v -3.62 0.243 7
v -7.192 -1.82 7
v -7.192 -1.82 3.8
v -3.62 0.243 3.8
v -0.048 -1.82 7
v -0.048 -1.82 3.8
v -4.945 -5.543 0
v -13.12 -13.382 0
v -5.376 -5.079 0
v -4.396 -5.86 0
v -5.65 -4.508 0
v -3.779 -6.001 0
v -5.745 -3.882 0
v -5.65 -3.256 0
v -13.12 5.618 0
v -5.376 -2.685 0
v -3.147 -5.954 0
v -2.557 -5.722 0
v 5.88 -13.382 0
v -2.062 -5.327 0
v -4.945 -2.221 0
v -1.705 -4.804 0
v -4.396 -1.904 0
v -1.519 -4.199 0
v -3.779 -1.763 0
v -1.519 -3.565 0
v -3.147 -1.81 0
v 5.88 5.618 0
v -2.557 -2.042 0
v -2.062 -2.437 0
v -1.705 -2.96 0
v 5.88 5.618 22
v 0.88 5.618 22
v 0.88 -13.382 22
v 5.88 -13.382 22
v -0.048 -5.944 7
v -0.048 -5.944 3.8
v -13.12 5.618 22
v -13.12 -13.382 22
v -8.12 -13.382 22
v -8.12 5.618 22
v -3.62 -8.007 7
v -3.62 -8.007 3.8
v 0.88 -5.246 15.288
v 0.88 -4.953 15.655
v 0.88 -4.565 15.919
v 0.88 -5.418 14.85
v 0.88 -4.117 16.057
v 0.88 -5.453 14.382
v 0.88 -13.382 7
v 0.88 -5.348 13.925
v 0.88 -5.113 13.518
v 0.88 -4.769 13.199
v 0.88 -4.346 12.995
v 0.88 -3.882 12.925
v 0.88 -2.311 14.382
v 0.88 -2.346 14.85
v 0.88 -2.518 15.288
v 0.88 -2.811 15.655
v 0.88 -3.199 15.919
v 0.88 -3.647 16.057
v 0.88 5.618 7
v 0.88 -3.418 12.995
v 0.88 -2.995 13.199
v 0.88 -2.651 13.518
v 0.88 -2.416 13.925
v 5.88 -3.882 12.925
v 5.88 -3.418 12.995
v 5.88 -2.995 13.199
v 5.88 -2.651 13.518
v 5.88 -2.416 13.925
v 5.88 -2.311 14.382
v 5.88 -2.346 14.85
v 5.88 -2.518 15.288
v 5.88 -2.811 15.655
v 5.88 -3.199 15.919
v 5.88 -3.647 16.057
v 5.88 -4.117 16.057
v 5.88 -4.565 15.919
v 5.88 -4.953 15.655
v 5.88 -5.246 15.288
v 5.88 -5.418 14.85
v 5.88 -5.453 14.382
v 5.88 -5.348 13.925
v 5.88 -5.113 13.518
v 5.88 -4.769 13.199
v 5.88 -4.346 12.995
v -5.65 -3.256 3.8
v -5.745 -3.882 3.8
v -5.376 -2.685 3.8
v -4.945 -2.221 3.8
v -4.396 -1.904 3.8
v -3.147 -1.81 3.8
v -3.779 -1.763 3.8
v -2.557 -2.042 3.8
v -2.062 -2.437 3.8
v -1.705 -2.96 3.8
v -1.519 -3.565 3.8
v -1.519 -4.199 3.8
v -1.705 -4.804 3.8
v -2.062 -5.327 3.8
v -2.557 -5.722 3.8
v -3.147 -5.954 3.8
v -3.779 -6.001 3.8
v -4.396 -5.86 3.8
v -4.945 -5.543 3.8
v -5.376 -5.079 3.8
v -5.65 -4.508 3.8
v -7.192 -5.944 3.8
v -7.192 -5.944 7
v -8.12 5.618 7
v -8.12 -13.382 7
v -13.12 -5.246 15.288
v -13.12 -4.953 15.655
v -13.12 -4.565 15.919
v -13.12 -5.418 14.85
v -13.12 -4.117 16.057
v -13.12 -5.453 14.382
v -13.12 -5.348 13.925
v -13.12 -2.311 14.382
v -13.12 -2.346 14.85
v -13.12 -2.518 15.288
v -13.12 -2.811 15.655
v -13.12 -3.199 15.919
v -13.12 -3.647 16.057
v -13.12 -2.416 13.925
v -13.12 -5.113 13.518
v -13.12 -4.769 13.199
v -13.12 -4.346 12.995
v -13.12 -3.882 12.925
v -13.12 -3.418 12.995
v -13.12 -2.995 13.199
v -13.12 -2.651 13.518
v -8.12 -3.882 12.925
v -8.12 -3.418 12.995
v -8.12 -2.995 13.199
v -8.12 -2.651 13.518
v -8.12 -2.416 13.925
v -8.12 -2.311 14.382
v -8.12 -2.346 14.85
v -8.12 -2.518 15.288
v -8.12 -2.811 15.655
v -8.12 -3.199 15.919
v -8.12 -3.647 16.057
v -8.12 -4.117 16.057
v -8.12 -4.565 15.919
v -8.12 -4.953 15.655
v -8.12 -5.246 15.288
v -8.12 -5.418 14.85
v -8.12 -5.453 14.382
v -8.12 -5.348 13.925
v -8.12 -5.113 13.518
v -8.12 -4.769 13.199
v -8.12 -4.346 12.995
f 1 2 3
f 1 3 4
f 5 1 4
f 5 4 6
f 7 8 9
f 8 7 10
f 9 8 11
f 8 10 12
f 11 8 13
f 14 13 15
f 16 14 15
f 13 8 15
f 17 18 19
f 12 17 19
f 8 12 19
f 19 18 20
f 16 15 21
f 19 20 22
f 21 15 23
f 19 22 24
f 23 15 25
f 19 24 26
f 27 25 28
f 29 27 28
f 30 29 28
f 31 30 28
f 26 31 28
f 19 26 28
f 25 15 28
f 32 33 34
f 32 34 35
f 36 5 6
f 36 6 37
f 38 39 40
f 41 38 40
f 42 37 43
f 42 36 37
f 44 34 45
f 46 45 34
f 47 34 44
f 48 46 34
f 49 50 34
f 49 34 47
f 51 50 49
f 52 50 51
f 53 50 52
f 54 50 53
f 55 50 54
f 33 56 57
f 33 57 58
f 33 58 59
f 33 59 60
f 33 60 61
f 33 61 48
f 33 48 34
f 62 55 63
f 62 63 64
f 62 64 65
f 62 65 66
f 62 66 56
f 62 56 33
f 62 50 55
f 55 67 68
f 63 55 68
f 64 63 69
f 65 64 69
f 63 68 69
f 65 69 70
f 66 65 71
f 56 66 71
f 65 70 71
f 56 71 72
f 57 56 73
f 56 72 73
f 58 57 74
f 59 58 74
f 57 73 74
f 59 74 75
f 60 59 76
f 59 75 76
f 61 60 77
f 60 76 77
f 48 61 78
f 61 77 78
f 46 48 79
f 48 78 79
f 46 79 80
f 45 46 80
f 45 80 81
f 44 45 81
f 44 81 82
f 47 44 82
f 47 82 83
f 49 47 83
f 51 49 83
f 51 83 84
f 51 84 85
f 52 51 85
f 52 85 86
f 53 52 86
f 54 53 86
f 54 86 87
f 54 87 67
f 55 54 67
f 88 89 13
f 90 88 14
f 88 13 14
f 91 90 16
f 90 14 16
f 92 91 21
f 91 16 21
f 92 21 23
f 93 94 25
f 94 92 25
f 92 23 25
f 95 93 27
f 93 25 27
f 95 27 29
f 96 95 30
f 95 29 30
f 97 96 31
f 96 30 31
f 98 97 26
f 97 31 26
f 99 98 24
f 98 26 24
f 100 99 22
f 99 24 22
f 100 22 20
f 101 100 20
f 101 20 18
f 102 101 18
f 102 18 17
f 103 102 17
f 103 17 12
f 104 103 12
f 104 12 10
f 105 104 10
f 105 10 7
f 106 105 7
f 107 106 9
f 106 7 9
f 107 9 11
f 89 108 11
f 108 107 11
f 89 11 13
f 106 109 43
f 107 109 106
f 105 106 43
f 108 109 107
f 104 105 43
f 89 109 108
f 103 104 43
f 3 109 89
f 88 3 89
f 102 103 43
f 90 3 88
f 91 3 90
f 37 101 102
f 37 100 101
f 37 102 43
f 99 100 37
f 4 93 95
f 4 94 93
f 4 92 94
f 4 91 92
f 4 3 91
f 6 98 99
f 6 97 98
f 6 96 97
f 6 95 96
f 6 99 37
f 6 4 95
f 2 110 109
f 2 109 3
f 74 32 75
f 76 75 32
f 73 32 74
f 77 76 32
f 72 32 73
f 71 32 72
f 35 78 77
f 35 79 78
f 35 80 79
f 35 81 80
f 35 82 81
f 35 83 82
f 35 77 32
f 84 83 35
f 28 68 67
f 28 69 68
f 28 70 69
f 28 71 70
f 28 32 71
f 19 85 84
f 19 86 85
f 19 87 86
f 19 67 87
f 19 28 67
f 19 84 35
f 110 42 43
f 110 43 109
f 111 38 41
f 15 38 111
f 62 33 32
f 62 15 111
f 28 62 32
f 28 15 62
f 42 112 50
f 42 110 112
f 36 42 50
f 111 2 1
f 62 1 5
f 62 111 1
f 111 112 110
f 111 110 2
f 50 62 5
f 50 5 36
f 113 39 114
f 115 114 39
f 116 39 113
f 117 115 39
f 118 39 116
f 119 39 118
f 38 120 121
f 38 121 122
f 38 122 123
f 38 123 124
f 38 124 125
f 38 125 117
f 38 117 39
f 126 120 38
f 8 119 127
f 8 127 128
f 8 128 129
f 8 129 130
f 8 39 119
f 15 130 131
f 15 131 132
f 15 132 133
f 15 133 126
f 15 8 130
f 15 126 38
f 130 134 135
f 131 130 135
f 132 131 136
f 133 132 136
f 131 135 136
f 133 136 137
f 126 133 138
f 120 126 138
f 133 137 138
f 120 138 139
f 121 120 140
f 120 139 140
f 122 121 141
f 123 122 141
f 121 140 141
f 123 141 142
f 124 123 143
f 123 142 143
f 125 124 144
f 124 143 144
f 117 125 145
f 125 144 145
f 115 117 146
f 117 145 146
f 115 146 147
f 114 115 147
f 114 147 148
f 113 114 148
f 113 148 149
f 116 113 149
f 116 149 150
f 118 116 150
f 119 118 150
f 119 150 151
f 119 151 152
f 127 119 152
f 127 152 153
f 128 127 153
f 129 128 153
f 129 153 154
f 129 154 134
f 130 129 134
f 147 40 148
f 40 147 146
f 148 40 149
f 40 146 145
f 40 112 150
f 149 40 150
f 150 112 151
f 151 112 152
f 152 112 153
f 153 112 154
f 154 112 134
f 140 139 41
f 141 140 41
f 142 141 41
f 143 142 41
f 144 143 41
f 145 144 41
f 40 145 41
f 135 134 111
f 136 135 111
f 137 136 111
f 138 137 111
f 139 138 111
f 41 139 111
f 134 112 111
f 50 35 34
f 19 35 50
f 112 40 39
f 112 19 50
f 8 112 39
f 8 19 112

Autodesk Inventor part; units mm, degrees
ref_plane "YZ Plane" through (0, 0, 0) normal (1, 0, 0) x (0, 1, 0)
ref_plane "XZ Plane" through (0, 0, 0) normal (0, 1, 0) x (-1, 0, 0)
ref_plane "XY Plane" through (0, 0, 0) normal (0, 0, 1) x (1, 0, 0)
sketch "Sketch1" plane through (0, 0, 0) normal (0, 0, 1) x (1, 0, 0)
  line L0 (-13.1198, 5.618) -> (5.8802, 5.618)
  line L1 (5.8802, 5.618) -> (5.8802, -13.382)
  line L2 (5.8802, -13.382) -> (-13.1198, -13.382)
  line L3 (-13.1198, -13.382) -> (-13.1198, 5.618)
  point P0 (0, 0)
  dimension "d0" = 19
  dimension "d1" = 19
extrude "Extrusion1" add sketch "Sketch1" along normal blind 7
sketch "Sketch2" plane through (0, 0, 7) normal (0, 0, 1) x (1, 0, 0)
  line L0 (5.8802, 5.618) -> (-13.1198, 5.618) projected
  line L1 (-13.1198, 5.618) -> (-13.1198, -13.382) projected
  line L2 (-13.1198, -13.382) -> (5.8802, -13.382) projected
  line L3 (5.8802, -13.382) -> (5.8802, 5.618) projected
  line L4 (-13.1198, -13.382) -> (5.8802, -13.382) projected
  line L5 (-8.1198, -13.382) -> (-8.1198, 5.618)
  line L6 (5.8802, 5.618) -> (-13.1198, 5.618) projected
  line L7 (0.8802, -13.382) -> (0.8802, 5.618)
  line L8 (-13.1198, 3.1934) -> (-8.1198, 3.1934) construction
  line L9 (-8.1198, 3.1934) -> (0.8802, 3.1934) construction
  line L10 (0.8802, 3.1934) -> (5.8802, 3.1934) construction
  point P0 (0, 0)
  dimension "d4" = 9
extrude "Extrusion2" add sketch "Sketch2" along normal blind 15 contours L3 L2 L7 L0 | L5 L2 L1 L0
sketch "Sketch3" plane through (0, 0, 0) normal (0, 0, -1) x (-1, 0, 0)
  circle A0 centre (3.6198, -3.882) radius 2.125
  line L0 (13.1198, 5.618) -> (-5.8802, 5.618) projected
  line L1 (13.1198, -13.382) -> (8.1198, -13.382) projected
  line L2 (-5.8802, 5.618) -> (13.1198, -13.382) construction
  line L3 (13.1198, 5.618) -> (-5.8802, -13.382) construction
  point P0 (0, 0)
  dimension "d7" = 4.25
extrude "Extrusion3" cut sketch "Sketch3" against normal up to next
sketch "Sketch4" plane through (5.8802, -13.382, 0) normal (1, 0, 0) x (0, 0, -1)
  circle A0 centre (-14.5, 9.5) radius 1.575
  line L0 (-7, 0) -> (-7, 19) projected
  line L1 (-7, 0) -> (-22, 0) projected
  line L2 (-22, 0) -> (-7, 19) construction
  line L3 (-22, 0) -> (-22, 19) projected
  line L4 (-7, 0) -> (-22, 19) construction
  point P0 (0, 13.382)
  dimension "d10" = 3.15
extrude "Extrusion4" cut sketch "Sketch4" against normal through all
sketch "Sketch5" plane through (0, 0, 7) normal (0, 0, 1) x (1, 0, 0)
  line L0 (-3.6198, 0.243) -> (-0.0475, -1.8195)
  line L1 (-0.0475, -1.8195) -> (-0.0475, -5.9445)
  line L2 (-0.0475, -5.9445) -> (-3.6198, -8.007)
  line L3 (-3.6198, -8.007) -> (-7.1922, -5.9445)
  line L4 (-7.1922, -5.9445) -> (-7.1922, -1.8195)
  line L5 (-7.1922, -1.8195) -> (-3.6198, 0.243)
  circle A0 centre (-3.6198, -3.882) radius 2.125 projected
  point P0 (0, 0)
  dimension "d13" = 8.25
extrude "Extrusion5" cut sketch "Sketch5" against normal blind 3.2
properties part number "YPulleySupportHolder"
